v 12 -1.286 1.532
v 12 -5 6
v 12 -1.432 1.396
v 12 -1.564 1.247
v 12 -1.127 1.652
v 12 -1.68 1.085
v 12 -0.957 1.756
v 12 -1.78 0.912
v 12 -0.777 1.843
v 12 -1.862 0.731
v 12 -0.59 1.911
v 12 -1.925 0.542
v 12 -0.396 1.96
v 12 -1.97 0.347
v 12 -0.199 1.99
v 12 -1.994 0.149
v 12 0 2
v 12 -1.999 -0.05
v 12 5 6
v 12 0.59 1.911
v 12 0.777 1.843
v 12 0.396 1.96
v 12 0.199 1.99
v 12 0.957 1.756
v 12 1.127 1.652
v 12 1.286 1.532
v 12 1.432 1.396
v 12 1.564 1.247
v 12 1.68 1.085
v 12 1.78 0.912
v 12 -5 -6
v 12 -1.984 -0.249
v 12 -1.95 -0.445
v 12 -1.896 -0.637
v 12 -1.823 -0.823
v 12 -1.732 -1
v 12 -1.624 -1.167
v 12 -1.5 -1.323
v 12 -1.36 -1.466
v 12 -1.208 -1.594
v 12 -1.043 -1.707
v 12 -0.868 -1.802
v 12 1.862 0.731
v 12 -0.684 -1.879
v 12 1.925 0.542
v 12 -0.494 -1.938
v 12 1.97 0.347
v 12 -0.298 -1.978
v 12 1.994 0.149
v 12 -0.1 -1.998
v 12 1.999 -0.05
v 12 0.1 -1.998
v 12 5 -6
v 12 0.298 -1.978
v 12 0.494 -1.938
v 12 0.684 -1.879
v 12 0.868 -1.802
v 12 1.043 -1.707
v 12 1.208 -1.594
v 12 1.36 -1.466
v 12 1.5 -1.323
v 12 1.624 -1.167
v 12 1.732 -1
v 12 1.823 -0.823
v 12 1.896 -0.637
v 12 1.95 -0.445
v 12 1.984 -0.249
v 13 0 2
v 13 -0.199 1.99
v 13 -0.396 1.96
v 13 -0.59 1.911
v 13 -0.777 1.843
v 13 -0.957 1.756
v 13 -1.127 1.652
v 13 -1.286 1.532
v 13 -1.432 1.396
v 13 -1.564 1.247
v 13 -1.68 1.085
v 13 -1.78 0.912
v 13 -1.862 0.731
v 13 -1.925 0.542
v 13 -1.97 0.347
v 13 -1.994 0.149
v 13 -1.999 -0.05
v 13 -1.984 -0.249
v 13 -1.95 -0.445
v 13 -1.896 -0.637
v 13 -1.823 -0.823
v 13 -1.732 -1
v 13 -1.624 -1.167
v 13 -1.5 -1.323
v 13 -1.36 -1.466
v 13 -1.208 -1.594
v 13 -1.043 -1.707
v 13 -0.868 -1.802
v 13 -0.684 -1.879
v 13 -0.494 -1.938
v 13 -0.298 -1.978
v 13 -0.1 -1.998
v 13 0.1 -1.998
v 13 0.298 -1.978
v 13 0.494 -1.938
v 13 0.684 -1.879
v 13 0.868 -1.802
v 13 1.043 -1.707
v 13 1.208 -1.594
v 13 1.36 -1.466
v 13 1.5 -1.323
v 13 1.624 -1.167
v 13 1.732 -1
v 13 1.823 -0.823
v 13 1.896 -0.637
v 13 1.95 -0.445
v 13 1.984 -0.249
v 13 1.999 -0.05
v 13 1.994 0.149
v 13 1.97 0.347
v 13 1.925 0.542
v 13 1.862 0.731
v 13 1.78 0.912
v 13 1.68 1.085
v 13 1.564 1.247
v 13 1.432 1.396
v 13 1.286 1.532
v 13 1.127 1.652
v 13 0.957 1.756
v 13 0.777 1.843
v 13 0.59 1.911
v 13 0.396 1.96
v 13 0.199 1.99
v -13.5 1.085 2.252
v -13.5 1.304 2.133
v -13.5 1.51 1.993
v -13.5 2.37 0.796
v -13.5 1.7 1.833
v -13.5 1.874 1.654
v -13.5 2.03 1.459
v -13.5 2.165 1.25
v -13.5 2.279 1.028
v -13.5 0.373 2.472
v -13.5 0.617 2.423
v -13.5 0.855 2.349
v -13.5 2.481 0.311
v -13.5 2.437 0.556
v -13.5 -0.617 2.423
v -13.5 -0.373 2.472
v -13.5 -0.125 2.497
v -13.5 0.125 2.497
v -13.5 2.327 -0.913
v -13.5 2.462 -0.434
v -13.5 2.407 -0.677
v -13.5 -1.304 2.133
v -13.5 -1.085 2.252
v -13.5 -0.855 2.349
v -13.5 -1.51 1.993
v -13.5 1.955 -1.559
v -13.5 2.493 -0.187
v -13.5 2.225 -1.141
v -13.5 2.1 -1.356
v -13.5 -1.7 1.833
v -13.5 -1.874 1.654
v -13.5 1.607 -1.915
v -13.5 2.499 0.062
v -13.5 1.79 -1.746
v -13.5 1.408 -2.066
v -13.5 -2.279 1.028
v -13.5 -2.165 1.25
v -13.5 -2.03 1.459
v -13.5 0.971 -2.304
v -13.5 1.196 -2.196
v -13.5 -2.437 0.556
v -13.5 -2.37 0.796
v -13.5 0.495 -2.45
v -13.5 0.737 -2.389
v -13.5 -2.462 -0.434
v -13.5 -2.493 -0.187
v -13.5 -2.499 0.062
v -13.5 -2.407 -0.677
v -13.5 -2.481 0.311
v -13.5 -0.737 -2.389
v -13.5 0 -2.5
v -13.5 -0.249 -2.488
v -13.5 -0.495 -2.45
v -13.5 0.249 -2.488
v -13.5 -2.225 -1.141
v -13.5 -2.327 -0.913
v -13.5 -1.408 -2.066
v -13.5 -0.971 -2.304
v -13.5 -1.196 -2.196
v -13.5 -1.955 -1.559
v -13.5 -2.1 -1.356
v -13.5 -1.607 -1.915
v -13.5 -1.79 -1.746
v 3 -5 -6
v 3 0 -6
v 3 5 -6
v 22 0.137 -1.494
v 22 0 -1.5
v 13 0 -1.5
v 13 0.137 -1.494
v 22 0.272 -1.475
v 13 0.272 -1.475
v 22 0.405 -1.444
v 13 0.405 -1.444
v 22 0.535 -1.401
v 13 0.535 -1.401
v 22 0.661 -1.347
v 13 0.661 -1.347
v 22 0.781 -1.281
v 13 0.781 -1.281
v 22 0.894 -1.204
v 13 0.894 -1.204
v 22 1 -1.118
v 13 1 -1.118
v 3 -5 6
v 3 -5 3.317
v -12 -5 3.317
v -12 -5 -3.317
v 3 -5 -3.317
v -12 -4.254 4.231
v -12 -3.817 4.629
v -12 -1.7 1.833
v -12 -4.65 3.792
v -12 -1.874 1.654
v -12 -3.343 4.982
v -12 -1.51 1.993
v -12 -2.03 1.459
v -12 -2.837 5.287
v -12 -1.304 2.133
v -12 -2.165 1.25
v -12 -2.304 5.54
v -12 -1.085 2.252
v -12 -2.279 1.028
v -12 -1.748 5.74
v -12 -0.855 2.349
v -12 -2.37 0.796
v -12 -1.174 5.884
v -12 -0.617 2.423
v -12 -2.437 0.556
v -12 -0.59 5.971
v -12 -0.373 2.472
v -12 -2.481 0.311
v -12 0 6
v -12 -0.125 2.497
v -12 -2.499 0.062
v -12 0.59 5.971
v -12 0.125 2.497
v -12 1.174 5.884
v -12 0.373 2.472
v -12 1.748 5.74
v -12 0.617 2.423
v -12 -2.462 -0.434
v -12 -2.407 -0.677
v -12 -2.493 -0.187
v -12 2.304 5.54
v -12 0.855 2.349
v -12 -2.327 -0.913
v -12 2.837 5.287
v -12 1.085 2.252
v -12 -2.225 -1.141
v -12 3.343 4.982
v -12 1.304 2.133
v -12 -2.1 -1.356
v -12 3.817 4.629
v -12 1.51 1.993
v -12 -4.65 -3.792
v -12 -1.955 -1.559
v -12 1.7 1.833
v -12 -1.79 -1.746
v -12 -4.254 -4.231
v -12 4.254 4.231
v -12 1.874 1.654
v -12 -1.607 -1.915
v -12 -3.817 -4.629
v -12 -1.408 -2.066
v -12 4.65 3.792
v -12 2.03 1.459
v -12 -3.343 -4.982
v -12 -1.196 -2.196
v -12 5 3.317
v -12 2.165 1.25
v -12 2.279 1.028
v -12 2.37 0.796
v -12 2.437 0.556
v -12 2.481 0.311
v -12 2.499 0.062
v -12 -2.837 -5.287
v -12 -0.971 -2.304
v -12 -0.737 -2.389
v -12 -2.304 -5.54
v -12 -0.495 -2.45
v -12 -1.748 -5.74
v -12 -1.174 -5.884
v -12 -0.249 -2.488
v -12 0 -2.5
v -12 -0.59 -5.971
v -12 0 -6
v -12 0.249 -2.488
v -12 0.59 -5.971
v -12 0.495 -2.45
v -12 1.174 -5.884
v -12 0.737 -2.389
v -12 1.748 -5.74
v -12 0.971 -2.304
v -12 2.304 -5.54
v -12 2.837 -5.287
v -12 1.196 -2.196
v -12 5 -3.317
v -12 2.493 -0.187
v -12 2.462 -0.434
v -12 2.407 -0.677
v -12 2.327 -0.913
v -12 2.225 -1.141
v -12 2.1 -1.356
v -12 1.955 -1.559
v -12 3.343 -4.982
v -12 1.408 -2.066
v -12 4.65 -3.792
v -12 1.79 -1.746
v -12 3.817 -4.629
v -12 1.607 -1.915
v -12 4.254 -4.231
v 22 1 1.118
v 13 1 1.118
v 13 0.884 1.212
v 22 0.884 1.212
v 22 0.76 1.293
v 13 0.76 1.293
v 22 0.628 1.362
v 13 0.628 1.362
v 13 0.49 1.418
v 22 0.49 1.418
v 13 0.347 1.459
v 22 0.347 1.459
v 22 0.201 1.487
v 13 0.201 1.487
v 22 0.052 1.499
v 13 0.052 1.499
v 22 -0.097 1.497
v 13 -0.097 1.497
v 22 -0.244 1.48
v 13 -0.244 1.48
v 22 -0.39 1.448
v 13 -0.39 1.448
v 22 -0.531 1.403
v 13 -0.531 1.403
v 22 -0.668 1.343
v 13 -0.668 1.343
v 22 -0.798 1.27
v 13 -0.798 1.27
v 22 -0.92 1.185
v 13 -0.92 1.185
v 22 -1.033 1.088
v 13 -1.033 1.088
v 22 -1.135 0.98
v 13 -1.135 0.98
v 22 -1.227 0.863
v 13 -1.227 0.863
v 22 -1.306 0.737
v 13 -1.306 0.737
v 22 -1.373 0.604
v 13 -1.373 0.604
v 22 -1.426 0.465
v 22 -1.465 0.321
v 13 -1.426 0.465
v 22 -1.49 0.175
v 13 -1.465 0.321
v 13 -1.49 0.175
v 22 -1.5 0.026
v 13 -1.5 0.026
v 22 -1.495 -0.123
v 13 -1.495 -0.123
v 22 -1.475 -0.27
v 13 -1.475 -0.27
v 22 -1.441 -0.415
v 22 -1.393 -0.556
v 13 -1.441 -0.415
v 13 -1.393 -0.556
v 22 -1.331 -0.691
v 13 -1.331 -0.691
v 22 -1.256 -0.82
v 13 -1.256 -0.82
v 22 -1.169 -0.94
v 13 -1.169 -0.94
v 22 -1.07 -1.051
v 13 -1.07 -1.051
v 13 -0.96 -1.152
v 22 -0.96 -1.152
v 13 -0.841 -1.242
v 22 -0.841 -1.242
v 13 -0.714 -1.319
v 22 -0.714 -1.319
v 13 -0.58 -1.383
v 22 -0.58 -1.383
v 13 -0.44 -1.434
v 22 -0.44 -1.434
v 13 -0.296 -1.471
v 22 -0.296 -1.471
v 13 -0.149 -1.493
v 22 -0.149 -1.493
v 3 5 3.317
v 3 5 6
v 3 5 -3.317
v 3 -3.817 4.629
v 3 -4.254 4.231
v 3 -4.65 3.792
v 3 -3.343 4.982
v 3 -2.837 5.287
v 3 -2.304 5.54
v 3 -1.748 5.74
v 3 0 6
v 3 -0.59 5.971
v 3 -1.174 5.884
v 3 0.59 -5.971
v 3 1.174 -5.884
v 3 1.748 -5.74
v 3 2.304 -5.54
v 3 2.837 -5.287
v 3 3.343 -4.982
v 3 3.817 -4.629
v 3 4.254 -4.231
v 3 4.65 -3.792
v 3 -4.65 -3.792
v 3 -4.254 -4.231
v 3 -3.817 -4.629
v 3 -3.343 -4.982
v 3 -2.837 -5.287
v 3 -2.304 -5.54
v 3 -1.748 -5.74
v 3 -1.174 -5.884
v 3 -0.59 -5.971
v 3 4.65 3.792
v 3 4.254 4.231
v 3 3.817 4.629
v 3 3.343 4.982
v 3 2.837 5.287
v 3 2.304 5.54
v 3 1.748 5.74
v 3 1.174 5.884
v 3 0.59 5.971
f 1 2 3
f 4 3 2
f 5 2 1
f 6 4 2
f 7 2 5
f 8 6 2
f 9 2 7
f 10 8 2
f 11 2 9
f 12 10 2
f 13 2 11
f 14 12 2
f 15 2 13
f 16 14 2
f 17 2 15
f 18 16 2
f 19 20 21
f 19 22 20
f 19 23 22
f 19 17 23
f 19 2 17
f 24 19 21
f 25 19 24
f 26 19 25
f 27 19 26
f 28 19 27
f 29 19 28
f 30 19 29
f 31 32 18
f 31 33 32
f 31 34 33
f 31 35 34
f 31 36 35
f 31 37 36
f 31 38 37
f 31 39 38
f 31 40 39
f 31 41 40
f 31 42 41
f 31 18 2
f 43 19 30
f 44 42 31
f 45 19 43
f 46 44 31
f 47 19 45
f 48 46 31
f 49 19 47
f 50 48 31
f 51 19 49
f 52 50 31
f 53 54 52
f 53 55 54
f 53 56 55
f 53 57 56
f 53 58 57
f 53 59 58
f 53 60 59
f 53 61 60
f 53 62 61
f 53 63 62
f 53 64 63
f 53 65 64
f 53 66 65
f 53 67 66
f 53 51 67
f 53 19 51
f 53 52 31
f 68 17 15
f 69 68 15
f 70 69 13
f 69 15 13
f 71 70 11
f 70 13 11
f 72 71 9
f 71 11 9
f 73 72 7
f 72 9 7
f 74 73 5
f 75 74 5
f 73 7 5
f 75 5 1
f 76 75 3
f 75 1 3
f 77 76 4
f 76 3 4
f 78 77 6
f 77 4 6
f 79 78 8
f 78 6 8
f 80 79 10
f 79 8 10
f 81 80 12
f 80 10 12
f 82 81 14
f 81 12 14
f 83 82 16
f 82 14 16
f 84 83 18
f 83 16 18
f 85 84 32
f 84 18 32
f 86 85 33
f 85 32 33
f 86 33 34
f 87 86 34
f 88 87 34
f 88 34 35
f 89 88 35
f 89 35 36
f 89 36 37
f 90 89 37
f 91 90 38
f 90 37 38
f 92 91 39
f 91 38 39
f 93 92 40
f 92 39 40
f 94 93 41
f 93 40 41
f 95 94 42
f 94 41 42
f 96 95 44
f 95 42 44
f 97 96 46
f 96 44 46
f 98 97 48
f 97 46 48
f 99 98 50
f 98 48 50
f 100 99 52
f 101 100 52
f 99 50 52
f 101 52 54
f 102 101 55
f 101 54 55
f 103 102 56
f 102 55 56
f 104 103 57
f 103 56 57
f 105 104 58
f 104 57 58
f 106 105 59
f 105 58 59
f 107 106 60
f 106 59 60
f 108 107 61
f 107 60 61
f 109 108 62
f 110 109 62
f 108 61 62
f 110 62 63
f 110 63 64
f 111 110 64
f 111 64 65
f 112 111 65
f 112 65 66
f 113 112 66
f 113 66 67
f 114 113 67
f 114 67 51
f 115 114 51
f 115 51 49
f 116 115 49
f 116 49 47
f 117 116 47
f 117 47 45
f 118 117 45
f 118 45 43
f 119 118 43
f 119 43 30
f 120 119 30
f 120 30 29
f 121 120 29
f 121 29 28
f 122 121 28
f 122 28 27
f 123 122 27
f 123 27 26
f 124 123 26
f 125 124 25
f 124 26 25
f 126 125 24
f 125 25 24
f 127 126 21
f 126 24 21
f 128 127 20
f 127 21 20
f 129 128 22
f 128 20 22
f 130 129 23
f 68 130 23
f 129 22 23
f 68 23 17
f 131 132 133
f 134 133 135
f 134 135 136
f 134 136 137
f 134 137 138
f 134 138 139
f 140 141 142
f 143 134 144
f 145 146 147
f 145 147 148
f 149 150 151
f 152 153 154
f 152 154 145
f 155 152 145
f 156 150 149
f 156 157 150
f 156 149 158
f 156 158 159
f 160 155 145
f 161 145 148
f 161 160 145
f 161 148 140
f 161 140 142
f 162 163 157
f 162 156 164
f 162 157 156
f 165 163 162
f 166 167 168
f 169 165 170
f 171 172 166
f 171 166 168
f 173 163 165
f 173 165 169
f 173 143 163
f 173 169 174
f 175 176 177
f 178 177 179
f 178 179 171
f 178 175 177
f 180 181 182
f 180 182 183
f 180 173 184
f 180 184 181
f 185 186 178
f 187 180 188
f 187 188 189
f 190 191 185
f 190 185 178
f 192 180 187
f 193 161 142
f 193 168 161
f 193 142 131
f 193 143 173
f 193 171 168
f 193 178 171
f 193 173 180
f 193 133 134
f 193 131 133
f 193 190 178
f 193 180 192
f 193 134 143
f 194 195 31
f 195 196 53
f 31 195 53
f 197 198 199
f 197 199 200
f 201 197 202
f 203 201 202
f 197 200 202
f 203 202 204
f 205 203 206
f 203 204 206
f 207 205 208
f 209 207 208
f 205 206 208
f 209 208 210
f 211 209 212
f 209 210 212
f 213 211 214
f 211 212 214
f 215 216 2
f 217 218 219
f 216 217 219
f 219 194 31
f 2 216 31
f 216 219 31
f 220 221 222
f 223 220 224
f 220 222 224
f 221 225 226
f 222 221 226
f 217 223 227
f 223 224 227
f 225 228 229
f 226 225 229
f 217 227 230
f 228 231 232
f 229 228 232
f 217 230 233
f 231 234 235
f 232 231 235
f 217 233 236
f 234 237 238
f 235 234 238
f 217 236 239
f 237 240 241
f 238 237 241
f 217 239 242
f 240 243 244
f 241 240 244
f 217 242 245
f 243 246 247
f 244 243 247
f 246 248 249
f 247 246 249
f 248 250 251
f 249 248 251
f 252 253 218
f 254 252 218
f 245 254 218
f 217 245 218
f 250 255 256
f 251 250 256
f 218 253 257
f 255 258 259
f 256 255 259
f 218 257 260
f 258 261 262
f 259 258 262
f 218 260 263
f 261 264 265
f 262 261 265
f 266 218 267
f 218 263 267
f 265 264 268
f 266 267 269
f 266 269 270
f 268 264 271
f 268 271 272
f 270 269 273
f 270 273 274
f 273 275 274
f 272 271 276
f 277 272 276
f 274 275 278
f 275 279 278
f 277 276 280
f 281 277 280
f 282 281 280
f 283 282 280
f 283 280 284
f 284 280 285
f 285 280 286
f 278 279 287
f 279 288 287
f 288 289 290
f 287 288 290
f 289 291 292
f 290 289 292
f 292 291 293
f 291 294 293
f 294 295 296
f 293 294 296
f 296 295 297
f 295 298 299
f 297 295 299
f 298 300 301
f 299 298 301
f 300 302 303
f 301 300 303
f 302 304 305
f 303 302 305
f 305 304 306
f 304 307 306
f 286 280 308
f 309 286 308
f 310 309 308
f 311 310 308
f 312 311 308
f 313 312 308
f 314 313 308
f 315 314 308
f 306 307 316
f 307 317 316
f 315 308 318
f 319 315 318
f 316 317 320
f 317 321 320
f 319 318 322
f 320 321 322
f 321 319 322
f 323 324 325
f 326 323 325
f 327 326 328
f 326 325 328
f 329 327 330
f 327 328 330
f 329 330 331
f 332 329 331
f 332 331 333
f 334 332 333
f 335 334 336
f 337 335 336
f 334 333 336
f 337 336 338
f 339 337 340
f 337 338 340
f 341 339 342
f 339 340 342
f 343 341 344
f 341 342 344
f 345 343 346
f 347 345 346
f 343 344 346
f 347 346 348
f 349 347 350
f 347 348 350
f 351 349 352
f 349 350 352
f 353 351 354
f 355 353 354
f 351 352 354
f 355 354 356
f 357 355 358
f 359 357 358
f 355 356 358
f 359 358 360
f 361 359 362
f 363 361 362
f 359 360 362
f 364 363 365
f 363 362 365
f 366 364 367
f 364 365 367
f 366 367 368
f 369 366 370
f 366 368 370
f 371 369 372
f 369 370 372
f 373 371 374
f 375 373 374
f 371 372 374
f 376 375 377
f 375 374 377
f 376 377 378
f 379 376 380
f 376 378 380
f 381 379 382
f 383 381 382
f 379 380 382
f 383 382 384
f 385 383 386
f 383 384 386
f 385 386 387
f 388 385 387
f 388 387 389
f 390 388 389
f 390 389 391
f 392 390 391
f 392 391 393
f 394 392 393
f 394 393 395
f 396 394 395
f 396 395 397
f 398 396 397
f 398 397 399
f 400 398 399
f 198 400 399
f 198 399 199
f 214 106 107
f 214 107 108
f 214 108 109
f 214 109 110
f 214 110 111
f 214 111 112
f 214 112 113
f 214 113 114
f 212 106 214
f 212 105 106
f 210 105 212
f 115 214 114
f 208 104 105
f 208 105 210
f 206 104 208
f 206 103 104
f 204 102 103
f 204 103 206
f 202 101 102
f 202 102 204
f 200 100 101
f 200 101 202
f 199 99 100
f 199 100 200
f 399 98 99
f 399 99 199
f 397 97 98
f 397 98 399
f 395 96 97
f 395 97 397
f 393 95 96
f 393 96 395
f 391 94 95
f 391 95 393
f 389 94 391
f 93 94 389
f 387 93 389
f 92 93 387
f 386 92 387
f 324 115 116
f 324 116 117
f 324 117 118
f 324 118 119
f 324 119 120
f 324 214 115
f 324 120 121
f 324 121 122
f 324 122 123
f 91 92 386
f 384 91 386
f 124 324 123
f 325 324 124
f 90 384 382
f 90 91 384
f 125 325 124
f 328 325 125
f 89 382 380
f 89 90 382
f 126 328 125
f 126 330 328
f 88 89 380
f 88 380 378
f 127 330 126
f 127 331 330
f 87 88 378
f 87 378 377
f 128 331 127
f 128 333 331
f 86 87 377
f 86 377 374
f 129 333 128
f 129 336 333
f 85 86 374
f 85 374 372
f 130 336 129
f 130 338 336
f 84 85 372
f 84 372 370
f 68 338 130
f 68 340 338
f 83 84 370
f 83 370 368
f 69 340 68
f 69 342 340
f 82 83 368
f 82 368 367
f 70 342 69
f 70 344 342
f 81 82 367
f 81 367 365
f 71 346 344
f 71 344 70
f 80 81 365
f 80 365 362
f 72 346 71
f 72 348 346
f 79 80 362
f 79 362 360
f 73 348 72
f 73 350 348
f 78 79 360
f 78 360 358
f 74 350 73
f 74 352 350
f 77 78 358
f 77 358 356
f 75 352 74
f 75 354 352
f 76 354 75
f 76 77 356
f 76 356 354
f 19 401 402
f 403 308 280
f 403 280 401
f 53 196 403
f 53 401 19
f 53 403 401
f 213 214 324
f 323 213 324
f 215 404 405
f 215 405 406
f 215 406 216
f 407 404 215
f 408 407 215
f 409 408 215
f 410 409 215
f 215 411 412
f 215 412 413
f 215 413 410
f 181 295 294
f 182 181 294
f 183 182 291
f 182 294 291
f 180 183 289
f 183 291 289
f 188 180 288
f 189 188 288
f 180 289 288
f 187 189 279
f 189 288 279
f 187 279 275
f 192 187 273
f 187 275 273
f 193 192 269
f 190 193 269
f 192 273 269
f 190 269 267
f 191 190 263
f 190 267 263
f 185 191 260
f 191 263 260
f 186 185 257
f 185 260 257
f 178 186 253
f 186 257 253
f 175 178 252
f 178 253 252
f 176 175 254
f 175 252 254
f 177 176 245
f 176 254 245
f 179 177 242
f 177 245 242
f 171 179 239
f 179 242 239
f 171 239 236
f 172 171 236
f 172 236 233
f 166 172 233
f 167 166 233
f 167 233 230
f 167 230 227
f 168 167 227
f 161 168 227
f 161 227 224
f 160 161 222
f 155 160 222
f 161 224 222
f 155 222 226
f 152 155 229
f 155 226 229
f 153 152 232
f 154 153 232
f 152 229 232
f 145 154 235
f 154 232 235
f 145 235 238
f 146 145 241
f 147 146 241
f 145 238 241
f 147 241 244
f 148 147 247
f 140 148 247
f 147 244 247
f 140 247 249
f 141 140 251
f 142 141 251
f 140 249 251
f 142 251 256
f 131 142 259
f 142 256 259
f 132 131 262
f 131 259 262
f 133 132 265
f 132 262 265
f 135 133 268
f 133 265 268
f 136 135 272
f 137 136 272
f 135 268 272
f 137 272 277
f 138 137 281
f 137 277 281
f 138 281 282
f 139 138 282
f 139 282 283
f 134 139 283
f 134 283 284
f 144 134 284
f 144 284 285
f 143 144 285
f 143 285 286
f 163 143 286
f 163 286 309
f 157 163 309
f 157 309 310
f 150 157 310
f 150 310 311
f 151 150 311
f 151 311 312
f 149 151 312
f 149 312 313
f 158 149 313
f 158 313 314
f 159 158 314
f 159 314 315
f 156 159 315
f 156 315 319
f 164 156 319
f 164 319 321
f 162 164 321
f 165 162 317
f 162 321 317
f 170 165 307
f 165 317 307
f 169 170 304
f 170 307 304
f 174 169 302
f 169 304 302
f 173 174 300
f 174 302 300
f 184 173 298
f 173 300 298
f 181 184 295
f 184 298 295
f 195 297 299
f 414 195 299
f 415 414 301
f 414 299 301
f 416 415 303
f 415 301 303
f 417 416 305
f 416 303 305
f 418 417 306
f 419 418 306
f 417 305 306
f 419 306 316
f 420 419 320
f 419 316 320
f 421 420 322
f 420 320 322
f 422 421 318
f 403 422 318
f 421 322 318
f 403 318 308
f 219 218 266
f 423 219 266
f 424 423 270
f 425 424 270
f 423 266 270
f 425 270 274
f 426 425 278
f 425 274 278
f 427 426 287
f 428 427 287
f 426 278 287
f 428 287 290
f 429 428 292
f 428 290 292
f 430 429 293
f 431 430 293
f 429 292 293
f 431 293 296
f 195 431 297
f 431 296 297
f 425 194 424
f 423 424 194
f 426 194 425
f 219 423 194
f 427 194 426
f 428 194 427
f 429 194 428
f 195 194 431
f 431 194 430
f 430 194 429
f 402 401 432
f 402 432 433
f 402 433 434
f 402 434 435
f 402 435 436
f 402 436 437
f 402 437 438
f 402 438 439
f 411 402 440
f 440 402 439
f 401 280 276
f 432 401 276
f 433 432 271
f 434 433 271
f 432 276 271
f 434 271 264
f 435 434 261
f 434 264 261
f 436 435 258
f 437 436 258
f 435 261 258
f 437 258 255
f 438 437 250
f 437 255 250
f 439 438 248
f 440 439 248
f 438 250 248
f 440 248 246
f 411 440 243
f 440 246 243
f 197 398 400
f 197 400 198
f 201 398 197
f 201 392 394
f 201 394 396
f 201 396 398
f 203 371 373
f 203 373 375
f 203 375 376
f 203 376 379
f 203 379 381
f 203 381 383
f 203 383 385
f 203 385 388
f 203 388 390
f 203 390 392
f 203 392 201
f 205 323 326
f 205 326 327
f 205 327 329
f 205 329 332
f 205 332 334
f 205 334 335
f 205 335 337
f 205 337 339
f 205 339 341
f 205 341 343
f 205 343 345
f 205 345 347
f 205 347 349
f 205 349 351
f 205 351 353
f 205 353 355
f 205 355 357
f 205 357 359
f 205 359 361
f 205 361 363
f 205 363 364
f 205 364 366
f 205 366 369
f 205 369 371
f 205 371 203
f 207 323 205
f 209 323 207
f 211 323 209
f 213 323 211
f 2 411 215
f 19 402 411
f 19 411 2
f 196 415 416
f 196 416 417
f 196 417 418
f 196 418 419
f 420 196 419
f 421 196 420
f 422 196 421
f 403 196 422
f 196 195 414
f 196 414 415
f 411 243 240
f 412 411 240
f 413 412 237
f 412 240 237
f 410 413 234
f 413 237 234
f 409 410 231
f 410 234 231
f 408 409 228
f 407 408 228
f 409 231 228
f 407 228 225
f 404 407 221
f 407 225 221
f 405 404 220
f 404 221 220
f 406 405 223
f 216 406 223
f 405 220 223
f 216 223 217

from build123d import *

# Parameters (mm, degrees)
SKETCH_1_W          = 24
SKETCH_1_H          = 12
EXTRUDE_1_DEPTH     = 5
CUT_EXTRUDE_1_DEPTH = 15
SKETCH_2_3_R        = 2.5
EXTRUDE_2_DEPTH     = 1.5
SKETCH_4_R          = 2
EXTRUDE_3_DEPTH     = 1
EXTRUDE_4_DEPTH     = 9


with BuildPart() as part:
    # Эскиз1 → Бобышка-Вытянуть1 (new, symmetric)
    with BuildSketch(Plane(origin=(0, 0, 0), x_dir=(1, 0, 0), z_dir=(0, 1, 0))):
        Rectangle(SKETCH_1_W, SKETCH_1_H)
    extrude(amount=EXTRUDE_1_DEPTH, both=True)

    # Эскиз2 → Вырез-Вытянуть1 (cut)
    with BuildSketch(Plane.ZY.offset(12)):
        with BuildLine():
            Line((6, -5), (6, 0))
            ThreePointArc((6, 0), (5.286764074, -2.837274331), (3.31662479, -5))
            Line((3.31662479, -5), (6, -5))
        make_face()
        with BuildLine():
            ThreePointArc((3.31662479, 5), (5.286764074, 2.837274331), (6, 0))
            Line((6, 0), (6, 5))
            Line((6, 5), (3.31662479, 5))
        make_face()
        with BuildLine():
            ThreePointArc((-6, 0), (-5.286764074, 2.837274331), (-3.31662479, 5))
            Line((-3.31662479, 5), (-6, 5))
            Line((-6, 5), (-6, 0))
        make_face()
        with BuildLine():
            Line((-6, -5), (-3.31662479, -5))
            ThreePointArc((-3.31662479, -5), (-5.286764074, -2.837274331), (-6, 0))
            Line((-6, 0), (-6, -5))
        make_face()
    extrude(amount=-CUT_EXTRUDE_1_DEPTH, mode=Mode.SUBTRACT)

    # Эскиз2<3> → Бобышка-Вытянуть2 (add)
    with BuildSketch(Plane.ZY.offset(12)):
        Circle(SKETCH_2_3_R)
    extrude(amount=EXTRUDE_2_DEPTH)

    # Эскиз4 → Бобышка-Вытянуть3 (add)
    with BuildSketch(Plane(origin=(12, 0, 0), x_dir=(0, 0, -1), z_dir=(1, 0, 0))):
        Circle(SKETCH_4_R)
    extrude(amount=EXTRUDE_3_DEPTH)

    # Эскиз5 → Бобышка-Вытянуть4 (add)
    with BuildSketch(Plane(origin=(13, 0, 0), x_dir=(0, 0, -1), z_dir=(1, 0, 0))):
        with BuildLine():
            Line((1.118033989, 1), (-1.118033989, 1))
            ThreePointArc((-1.118033989, 1), (-0.535233135, -1.401258538), (1.5, 0))
            ThreePointArc((1.5, 0), (1.401258538, 0.535233135), (1.118033989, 1))
        make_face()
    extrude(amount=EXTRUDE_4_DEPTH)


solid = part.part
